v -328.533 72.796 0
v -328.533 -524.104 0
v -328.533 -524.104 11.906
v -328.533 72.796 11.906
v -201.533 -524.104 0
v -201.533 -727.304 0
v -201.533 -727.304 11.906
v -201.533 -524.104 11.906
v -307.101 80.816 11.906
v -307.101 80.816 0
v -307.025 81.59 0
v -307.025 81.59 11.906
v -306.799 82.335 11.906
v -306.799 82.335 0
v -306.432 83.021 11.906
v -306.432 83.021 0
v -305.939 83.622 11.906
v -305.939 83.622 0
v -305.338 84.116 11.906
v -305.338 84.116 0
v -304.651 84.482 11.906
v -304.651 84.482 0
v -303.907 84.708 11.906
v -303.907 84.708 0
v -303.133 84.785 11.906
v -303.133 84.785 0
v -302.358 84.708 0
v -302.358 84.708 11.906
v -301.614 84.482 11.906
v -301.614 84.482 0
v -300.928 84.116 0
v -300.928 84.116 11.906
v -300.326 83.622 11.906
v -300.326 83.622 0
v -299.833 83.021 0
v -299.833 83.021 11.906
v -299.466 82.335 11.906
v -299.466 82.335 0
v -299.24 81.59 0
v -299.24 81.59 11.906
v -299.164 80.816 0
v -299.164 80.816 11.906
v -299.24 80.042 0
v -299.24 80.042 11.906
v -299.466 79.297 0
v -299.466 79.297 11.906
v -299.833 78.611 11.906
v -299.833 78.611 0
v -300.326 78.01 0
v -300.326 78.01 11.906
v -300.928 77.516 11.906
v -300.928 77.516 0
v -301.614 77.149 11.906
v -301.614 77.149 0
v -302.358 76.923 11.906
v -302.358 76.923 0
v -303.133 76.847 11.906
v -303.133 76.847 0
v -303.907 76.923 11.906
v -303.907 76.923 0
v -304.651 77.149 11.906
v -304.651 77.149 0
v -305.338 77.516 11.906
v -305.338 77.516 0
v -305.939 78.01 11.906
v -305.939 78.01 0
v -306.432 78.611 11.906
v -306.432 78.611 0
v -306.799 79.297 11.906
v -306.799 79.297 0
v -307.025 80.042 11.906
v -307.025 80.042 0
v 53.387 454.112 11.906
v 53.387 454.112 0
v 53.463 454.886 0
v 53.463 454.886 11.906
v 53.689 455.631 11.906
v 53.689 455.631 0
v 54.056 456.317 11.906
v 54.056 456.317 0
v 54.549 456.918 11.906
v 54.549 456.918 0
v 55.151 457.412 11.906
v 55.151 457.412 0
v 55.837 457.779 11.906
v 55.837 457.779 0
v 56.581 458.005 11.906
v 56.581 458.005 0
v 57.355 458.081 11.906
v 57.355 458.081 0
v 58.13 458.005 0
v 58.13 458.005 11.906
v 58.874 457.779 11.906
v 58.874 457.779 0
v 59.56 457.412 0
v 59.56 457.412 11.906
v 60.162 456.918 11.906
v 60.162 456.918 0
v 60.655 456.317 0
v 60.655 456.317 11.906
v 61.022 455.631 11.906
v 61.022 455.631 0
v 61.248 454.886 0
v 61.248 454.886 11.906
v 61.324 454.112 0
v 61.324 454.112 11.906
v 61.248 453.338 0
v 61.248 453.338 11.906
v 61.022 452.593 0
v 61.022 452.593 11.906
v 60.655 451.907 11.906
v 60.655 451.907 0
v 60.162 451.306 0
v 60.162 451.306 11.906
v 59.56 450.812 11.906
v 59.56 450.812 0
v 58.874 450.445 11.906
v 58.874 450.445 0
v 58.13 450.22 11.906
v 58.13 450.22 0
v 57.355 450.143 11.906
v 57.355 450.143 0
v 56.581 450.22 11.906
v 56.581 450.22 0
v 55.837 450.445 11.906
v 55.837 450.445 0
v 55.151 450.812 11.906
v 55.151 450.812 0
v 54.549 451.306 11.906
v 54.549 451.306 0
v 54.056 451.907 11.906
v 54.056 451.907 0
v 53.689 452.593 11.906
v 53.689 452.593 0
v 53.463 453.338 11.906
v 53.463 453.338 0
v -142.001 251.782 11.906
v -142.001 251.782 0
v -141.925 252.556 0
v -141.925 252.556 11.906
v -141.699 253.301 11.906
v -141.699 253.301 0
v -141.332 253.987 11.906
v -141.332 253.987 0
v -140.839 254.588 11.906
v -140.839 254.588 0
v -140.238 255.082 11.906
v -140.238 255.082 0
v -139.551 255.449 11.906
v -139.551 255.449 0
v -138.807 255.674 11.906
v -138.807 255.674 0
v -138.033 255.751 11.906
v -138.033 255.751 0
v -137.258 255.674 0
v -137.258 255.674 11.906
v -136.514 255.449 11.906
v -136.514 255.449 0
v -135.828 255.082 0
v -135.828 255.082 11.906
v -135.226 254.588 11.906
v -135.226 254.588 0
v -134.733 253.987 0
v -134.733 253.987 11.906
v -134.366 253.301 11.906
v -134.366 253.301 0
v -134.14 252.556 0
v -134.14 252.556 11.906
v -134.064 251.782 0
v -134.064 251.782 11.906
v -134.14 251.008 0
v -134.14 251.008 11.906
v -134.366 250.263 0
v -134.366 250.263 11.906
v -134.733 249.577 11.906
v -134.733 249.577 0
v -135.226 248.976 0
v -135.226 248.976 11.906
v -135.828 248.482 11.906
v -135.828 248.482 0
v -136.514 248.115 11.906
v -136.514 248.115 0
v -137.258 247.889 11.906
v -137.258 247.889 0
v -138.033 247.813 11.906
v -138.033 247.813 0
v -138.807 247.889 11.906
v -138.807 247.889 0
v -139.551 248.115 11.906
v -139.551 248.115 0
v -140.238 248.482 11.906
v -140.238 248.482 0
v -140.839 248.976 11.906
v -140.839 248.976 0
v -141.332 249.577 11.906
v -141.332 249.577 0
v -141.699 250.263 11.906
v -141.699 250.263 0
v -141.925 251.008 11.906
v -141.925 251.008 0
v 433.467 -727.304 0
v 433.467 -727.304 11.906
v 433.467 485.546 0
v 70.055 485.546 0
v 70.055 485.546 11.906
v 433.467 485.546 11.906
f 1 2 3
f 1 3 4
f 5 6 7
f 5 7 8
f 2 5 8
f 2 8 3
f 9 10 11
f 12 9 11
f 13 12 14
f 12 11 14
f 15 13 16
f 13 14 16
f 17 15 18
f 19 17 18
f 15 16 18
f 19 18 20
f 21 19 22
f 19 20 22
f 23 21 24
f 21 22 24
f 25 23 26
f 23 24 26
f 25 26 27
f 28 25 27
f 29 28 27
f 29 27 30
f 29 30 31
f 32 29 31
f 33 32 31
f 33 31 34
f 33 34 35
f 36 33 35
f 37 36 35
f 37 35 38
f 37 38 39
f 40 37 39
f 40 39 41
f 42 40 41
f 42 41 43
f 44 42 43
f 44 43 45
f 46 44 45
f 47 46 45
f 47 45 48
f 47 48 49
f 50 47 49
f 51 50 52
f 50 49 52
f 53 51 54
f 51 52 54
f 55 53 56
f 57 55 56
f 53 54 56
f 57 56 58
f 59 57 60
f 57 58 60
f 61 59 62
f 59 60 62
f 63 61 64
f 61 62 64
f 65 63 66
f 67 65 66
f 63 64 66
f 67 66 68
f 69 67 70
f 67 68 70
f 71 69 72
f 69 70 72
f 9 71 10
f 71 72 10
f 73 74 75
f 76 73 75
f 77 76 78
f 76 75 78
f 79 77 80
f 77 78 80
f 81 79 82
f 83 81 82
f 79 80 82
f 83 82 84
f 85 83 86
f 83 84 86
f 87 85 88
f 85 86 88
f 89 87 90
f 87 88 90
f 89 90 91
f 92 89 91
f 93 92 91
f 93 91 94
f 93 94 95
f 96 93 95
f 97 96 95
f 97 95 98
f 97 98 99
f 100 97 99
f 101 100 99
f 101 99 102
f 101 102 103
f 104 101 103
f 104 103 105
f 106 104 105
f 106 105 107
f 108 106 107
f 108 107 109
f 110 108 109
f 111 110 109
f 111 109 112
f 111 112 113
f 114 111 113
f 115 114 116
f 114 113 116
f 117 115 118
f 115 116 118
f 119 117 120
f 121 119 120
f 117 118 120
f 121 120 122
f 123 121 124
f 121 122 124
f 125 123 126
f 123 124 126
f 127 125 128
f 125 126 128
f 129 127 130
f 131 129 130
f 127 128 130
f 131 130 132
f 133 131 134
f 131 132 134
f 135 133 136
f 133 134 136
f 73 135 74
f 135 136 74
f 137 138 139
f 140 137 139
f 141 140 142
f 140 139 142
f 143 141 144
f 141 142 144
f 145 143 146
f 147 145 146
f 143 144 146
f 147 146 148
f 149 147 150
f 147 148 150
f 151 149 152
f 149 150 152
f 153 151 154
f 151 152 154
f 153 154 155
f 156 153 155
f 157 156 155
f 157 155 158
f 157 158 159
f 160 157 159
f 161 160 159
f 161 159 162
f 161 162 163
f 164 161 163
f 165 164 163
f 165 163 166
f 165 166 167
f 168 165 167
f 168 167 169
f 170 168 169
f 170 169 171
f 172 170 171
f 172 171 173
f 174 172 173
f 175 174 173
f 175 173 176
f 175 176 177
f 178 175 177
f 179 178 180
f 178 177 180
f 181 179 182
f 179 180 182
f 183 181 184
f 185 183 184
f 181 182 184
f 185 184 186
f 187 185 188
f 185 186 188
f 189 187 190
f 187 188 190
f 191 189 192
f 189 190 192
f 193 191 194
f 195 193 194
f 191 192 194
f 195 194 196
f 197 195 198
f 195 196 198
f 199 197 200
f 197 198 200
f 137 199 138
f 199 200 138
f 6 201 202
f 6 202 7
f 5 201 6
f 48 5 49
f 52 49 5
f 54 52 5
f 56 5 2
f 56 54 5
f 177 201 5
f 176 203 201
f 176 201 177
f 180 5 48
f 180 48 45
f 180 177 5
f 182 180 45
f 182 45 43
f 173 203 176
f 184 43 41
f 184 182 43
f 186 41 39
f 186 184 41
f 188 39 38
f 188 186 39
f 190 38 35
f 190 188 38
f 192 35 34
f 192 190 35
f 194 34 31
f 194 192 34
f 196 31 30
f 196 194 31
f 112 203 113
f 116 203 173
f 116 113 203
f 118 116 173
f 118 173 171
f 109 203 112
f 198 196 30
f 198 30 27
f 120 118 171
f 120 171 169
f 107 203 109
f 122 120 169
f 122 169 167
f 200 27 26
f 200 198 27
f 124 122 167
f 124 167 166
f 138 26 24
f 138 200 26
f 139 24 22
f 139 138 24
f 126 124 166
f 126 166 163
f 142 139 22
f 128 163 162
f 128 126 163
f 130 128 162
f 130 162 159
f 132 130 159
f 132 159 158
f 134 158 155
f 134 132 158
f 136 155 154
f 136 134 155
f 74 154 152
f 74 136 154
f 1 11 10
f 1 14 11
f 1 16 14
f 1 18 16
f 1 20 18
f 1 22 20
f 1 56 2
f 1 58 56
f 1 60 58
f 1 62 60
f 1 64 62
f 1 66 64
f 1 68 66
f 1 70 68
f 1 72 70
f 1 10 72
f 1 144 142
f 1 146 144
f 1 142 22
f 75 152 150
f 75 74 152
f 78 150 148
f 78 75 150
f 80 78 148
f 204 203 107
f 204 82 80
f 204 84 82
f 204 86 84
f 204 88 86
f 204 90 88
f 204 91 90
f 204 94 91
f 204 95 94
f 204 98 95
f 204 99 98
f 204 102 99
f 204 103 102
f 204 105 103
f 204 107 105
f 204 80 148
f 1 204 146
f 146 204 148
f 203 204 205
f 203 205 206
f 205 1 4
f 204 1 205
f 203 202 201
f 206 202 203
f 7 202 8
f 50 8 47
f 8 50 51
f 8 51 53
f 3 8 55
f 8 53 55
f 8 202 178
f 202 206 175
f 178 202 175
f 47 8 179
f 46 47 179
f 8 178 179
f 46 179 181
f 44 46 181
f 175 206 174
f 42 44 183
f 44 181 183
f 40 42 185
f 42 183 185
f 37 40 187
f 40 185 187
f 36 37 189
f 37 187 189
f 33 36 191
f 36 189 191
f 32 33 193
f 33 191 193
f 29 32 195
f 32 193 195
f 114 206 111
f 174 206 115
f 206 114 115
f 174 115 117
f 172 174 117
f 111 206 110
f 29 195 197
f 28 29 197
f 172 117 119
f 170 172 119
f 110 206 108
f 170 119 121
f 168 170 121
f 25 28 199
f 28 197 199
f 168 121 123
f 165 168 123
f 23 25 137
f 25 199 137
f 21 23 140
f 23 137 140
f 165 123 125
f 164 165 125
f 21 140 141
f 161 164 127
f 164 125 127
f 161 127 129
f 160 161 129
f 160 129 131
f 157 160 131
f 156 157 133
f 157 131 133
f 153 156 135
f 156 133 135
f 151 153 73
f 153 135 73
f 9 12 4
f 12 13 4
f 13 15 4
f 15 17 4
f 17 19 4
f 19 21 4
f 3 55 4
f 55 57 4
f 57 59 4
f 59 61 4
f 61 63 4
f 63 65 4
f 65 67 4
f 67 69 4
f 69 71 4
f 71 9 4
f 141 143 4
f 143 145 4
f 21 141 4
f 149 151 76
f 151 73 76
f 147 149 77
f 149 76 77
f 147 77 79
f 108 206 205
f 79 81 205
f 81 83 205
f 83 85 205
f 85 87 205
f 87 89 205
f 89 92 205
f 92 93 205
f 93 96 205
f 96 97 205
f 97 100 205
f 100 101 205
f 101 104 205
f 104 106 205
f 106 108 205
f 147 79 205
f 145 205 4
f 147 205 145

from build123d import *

# Parameters (mm, degrees)
BOSS_EXTRUDE1_DEPTH            = 11.90625
F_5_16_0_3125_DIAMETER_HOLE1_D = 7.9375
SKETCH4_W                      = 635
SKETCH4_H                      = 1212.85
CUT_EXTRUDE1_DEPTH             = 12.90625


with BuildPart() as part:
    # Sketch1 → Boss-Extrude1 (new body)
    with BuildSketch(Plane.XY):
        Polygon((1068.467396061, -524.104266958), (941.467396061, -524.104266958), (941.467396061, -727.304266958), (-201.532603939, -727.304266958), (-201.532603939, -524.104266958), (-328.532603939, -524.104266958), (-328.532603939, 72.795733042), (70.055437863, 485.545733042), (669.87935426, 485.545733042), (1068.467396061, 72.795733042), align=None)
    extrude(amount=BOSS_EXTRUDE1_DEPTH)

    # 5/16 (0.3125) Diameter Hole1 (through all)
    with Locations(Plane.XY.offset(11.90625)):
        with Locations((-303.132603939, 80.815834959), (-138.032603939, 251.781889765), (57.355437863, 454.112130003), (682.57935426, 454.112130003), (877.967396061, 251.781889765), (1043.067396061, 80.815834959)):
            Hole(F_5_16_0_3125_DIAMETER_HOLE1_D / 2)

    # Sketch4 → Cut-Extrude1 (cut, through all)
    with BuildSketch(Plane.XY.offset(11.90625)):
        with Locations((750.967396061, -120.879266958)):
            Rectangle(SKETCH4_W, SKETCH4_H)
    extrude(amount=-CUT_EXTRUDE1_DEPTH, mode=Mode.SUBTRACT)


solid = part.part
